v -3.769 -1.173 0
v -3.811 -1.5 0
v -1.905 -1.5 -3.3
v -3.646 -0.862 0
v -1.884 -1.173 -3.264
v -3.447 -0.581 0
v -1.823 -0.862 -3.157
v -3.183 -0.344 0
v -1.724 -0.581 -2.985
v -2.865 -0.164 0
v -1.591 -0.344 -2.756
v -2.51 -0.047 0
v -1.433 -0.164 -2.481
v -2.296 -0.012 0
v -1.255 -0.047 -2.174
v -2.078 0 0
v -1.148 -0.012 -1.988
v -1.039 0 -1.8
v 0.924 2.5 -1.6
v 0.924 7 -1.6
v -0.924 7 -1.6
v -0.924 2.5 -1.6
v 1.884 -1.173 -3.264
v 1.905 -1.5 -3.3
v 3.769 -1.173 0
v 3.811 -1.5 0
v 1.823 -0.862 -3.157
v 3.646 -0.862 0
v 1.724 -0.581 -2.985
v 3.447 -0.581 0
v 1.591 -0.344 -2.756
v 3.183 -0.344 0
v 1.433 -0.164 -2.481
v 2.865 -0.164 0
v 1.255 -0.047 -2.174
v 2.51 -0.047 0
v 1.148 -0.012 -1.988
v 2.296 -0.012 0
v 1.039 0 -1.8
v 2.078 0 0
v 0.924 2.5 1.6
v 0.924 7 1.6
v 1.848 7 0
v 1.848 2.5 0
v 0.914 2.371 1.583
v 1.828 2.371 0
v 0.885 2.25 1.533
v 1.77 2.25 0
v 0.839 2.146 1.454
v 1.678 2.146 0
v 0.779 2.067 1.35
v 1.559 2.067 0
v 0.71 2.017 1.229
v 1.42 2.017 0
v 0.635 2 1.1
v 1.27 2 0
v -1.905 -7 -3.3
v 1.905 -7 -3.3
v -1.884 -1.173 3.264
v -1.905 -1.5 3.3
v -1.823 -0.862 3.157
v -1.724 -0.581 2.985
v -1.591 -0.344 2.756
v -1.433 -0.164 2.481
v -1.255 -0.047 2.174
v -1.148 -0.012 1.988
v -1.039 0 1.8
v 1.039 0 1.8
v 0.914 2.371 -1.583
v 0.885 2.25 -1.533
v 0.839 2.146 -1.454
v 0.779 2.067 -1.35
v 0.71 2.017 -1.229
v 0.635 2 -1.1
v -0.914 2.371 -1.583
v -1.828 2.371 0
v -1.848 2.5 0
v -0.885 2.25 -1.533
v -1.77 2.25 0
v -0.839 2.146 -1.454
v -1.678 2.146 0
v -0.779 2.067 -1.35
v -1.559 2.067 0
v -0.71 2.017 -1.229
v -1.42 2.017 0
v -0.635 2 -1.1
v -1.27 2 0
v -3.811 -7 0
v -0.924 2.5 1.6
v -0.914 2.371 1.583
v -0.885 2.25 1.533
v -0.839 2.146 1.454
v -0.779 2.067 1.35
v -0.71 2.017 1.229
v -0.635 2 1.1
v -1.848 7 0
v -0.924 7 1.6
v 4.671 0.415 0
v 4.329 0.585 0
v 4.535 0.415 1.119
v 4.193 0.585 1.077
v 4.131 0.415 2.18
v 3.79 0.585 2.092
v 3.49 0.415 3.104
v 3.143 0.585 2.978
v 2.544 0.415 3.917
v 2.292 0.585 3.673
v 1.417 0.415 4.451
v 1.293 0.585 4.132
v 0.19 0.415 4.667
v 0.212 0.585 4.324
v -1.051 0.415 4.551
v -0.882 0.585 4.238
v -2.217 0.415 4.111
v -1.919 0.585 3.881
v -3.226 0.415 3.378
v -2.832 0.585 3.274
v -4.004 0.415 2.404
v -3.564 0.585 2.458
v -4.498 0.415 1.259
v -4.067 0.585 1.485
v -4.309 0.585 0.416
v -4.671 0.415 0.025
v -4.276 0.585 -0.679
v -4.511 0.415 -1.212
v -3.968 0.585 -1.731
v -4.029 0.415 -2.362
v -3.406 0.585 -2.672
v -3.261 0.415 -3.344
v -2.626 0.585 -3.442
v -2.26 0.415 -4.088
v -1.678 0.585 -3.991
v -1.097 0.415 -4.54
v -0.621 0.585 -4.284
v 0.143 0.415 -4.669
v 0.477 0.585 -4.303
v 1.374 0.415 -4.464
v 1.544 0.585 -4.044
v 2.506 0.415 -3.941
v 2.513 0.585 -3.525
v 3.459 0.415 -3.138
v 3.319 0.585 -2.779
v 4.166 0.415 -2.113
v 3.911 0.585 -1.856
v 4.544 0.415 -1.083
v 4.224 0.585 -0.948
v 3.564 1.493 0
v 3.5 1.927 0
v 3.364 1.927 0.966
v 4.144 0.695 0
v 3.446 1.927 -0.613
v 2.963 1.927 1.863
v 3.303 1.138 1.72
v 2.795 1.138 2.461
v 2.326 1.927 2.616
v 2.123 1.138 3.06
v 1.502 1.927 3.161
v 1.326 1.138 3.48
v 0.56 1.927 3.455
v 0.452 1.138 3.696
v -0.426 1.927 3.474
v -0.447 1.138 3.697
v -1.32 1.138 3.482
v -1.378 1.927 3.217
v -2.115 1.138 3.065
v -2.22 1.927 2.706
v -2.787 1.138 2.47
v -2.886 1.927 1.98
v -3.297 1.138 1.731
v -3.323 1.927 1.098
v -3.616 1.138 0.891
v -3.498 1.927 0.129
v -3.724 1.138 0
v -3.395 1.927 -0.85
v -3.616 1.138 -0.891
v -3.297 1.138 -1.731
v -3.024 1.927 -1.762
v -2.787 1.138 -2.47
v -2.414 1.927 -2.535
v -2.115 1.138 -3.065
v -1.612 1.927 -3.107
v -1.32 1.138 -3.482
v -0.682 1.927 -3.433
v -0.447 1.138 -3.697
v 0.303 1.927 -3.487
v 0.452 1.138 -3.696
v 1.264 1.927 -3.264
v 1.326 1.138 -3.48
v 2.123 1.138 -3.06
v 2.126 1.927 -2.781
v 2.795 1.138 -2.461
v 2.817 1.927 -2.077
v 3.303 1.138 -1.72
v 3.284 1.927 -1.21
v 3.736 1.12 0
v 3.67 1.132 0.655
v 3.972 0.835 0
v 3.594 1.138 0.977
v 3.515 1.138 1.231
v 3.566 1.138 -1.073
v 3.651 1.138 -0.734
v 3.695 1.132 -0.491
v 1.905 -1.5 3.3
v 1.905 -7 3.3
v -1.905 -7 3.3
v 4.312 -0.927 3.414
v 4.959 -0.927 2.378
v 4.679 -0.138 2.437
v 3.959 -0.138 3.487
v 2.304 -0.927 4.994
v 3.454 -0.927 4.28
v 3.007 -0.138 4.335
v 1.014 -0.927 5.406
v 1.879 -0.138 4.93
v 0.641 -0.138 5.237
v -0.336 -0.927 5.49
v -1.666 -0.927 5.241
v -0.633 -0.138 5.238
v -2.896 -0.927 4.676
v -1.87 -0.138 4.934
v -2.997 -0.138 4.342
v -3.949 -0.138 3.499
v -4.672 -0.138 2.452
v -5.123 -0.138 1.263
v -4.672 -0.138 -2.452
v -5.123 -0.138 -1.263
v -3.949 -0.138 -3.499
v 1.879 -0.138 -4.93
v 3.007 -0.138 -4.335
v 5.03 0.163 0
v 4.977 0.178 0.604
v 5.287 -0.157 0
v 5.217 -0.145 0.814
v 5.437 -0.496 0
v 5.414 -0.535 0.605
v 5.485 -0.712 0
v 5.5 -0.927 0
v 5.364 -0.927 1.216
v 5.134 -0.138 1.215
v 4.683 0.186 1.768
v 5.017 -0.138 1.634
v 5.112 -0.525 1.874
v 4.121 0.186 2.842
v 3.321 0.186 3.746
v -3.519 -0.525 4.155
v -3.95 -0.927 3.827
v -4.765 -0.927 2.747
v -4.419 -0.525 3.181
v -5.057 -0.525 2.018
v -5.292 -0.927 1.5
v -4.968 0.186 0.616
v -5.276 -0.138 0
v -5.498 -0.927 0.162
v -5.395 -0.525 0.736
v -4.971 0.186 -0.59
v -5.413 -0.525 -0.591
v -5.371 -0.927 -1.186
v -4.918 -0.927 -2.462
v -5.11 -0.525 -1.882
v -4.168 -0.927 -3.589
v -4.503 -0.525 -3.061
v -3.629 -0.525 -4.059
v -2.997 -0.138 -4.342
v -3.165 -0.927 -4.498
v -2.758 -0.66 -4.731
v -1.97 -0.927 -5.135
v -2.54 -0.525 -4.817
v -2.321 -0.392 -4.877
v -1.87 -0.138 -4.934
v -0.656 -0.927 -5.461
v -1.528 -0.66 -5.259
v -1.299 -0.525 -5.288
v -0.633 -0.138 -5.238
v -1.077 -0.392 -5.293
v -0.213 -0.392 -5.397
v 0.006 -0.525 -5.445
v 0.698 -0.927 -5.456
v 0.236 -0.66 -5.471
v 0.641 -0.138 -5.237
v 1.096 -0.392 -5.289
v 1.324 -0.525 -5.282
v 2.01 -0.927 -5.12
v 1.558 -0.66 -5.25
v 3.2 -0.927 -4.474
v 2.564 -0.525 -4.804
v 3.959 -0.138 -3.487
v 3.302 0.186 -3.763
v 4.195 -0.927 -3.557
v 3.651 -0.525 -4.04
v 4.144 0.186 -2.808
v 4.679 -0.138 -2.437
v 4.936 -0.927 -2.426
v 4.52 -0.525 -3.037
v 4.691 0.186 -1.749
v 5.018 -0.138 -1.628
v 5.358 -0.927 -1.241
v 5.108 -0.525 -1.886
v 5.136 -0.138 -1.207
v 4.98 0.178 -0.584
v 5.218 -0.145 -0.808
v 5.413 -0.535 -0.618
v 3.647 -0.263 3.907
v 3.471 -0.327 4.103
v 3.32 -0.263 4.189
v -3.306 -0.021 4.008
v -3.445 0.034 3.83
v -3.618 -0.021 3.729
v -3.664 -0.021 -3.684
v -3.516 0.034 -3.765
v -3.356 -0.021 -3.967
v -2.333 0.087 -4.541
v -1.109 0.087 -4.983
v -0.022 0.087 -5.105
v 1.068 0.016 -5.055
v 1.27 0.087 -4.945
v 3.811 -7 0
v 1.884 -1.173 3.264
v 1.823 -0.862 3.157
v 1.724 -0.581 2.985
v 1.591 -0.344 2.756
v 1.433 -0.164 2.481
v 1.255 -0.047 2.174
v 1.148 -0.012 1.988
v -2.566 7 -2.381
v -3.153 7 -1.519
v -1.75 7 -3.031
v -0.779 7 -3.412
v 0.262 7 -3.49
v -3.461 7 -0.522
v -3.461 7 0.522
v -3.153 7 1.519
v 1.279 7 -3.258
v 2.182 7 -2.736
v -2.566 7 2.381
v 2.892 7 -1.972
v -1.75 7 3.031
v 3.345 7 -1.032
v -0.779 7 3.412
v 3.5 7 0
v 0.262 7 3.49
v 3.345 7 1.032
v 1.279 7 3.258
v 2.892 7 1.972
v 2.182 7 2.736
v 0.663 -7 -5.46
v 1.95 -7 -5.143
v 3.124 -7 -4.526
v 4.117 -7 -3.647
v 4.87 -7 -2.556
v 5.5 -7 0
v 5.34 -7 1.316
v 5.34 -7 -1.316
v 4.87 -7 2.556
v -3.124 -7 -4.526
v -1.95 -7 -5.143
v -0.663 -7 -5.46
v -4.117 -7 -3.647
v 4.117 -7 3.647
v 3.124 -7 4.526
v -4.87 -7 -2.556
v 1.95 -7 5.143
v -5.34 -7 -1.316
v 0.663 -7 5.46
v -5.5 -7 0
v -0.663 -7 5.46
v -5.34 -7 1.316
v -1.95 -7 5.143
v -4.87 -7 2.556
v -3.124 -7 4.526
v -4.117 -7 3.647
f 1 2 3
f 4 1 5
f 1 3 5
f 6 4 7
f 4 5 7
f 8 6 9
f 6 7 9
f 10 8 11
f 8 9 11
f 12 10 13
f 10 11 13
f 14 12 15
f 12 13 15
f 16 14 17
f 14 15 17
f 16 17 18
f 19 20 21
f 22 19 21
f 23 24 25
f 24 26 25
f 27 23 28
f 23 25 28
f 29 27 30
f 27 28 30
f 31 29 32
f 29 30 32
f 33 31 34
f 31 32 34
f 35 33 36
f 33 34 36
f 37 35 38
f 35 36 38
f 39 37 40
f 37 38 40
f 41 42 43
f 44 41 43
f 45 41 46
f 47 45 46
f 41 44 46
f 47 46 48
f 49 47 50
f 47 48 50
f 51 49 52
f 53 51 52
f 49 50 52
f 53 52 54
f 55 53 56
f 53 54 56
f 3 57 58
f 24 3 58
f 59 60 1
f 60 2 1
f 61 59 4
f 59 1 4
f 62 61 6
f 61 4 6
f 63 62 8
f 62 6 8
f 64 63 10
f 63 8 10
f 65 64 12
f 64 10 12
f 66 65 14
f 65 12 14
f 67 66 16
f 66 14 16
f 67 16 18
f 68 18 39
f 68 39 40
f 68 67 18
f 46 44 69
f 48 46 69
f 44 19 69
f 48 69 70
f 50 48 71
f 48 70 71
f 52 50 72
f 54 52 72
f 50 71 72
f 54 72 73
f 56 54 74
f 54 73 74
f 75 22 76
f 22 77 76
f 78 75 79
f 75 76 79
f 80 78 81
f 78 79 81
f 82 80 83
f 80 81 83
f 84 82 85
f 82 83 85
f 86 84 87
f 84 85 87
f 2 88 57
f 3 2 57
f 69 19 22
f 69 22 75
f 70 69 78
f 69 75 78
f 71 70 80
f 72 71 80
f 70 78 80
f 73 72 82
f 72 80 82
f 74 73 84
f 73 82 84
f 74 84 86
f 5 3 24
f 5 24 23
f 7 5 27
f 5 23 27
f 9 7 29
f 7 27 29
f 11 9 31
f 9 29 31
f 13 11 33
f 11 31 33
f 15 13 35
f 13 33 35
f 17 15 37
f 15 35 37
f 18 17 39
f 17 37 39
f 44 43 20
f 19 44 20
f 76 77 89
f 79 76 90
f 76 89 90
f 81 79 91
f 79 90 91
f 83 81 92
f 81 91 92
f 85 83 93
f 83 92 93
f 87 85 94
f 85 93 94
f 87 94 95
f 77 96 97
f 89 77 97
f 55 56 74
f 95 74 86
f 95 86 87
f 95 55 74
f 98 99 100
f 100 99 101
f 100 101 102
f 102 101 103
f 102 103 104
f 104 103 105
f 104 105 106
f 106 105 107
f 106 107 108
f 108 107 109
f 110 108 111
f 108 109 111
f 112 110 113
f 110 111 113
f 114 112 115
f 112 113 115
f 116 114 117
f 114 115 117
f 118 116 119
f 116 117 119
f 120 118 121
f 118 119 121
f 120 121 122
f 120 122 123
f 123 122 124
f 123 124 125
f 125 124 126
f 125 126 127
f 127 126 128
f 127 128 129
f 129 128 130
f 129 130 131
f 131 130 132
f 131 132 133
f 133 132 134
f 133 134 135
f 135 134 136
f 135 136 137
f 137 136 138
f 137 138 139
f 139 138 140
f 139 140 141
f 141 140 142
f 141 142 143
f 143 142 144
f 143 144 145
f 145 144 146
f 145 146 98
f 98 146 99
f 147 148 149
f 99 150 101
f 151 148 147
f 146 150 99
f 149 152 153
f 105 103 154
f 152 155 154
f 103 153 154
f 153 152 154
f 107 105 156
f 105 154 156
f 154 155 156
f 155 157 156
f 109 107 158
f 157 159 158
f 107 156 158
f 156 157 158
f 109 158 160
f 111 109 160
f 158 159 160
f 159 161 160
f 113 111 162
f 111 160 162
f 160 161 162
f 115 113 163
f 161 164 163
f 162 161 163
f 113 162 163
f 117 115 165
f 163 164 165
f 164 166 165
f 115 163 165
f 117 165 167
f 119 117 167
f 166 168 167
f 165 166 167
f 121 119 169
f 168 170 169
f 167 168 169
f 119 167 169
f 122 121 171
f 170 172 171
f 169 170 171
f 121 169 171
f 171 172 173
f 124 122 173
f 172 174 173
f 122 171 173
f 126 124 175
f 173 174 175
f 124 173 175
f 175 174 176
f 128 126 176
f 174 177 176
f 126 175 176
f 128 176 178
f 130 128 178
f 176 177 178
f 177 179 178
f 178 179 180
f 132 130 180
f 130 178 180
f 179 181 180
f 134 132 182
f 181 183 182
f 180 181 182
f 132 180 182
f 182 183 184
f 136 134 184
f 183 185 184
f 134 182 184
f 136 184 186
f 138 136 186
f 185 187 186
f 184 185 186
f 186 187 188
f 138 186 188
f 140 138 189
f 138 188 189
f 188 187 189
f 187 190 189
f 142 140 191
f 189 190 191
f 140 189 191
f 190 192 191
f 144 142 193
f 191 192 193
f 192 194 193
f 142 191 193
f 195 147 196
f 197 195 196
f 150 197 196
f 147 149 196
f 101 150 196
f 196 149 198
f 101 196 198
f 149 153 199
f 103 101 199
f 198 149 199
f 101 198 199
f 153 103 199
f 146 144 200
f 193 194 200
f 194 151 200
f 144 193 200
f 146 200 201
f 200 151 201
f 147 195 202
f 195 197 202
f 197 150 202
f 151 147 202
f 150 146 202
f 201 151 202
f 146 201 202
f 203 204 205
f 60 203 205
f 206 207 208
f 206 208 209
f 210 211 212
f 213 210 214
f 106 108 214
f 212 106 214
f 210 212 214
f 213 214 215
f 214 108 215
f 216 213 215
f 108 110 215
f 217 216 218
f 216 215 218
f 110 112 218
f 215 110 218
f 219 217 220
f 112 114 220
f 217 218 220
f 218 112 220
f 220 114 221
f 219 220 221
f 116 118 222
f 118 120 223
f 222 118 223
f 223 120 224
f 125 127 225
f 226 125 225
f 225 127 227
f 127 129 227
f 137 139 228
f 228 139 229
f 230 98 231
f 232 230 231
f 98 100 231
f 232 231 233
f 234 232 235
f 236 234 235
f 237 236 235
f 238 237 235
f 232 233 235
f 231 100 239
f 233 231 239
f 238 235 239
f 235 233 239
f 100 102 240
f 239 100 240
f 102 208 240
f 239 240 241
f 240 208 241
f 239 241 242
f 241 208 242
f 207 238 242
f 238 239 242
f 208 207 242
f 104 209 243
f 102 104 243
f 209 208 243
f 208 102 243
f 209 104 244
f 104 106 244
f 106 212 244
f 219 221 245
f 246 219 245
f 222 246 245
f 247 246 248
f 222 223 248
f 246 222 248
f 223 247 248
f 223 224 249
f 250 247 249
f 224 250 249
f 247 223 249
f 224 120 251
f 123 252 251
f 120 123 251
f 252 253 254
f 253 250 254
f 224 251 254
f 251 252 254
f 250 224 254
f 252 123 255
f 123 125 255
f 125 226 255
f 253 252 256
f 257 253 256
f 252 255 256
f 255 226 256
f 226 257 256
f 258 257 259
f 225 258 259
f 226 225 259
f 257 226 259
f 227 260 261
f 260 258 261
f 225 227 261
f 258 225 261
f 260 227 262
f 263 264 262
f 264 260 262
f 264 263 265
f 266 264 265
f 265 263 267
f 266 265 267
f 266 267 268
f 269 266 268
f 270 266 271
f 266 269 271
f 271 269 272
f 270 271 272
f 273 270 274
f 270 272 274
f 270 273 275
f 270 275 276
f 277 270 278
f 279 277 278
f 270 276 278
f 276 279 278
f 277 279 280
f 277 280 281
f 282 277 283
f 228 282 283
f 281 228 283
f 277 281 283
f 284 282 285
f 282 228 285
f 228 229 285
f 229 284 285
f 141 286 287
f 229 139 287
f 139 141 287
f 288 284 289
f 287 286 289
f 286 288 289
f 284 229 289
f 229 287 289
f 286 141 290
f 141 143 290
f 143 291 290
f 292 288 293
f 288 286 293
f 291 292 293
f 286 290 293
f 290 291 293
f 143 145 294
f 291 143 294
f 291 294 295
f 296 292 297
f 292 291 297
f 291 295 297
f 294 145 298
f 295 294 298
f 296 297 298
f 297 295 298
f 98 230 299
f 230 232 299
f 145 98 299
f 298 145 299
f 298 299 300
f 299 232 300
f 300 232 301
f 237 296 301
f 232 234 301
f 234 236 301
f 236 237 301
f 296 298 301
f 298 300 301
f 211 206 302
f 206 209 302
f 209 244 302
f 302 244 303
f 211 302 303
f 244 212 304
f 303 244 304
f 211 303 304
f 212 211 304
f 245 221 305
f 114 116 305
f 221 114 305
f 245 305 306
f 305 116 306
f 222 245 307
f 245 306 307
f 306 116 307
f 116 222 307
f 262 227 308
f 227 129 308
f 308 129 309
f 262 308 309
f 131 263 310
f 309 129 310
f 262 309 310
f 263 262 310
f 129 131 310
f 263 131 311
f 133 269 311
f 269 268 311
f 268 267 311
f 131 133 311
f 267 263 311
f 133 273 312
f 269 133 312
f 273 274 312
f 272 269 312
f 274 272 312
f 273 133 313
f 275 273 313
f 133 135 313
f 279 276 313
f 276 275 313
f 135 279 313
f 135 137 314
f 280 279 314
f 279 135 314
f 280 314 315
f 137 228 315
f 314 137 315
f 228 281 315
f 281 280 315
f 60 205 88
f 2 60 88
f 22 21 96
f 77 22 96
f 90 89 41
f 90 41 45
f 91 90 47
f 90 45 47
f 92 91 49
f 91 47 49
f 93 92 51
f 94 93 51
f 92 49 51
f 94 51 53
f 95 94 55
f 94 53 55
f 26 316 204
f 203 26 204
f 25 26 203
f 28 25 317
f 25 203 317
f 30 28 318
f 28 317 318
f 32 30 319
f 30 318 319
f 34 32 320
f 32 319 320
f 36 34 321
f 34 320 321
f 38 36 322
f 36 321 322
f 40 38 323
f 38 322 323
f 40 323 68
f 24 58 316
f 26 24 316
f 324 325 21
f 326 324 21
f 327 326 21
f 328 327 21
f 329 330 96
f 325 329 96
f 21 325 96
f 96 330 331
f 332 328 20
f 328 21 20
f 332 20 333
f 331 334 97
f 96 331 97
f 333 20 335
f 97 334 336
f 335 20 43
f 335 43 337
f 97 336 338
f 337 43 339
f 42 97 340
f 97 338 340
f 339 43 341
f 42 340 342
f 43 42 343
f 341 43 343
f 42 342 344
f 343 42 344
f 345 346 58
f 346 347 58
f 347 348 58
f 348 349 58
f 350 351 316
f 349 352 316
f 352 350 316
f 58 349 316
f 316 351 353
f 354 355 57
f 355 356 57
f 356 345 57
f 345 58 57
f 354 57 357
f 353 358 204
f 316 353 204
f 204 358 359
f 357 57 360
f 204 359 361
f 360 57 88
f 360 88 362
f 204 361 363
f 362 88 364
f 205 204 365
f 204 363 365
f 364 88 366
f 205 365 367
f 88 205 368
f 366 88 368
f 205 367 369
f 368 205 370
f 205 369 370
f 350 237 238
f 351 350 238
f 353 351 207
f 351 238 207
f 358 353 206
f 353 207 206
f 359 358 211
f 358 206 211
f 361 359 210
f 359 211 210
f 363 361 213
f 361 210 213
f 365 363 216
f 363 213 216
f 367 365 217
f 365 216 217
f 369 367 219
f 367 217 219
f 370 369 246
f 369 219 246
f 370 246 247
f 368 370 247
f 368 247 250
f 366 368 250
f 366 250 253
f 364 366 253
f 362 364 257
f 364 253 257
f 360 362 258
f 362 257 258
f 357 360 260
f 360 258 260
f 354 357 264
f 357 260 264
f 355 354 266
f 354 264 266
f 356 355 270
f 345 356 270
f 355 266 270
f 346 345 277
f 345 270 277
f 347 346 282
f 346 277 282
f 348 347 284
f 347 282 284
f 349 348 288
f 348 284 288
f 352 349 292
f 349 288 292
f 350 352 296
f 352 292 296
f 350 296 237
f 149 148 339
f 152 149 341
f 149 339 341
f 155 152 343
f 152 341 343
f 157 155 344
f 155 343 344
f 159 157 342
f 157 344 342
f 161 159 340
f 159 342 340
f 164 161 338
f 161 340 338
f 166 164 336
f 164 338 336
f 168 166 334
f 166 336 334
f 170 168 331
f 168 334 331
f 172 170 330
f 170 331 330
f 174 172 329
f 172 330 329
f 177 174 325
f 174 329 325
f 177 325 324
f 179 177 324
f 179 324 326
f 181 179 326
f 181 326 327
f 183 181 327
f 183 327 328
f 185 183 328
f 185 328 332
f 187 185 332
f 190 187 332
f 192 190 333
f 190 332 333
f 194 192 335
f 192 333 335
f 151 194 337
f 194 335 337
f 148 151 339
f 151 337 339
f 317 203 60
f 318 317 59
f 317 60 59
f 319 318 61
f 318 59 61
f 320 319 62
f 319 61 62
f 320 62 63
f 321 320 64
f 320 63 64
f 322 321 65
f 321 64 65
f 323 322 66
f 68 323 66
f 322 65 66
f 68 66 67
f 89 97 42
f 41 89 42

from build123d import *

# Parameters (mm, degrees)
F3_DEPTH = 5
F5_R     = 1.5
F6_DEPTH = 7
F7_R     = 1.5
F8_R     = 0.5


with BuildPart() as f1:
    # F0 (on Top) → F1 (revolve)
    with BuildSketch(Plane.XY):
        Polygon((3.5, 1), (3.5, 7), (0, 7), (0, -7), (5.5, -7), (5.5, 0), align=None)
    revolve(axis=Axis((0, -5.739396, 0), (0, -1, 0)))

    # F2 (on face) → F3 (cut)
    with BuildSketch(Plane(origin=(0, 7, 0), x_dir=(-1, 0, 0), z_dir=(0, 1, 0))):
        Polygon((0.92376, -1.6), (1.847521, 0), (0.92376, 1.6), (-0.92376, 1.6), (-1.847521, 0), (-0.92376, -1.6), align=None)
    extrude(amount=-F3_DEPTH, mode=Mode.SUBTRACT)

    # F5
    f5_edges = [f1.edges().sort_by_distance(p)[0] for p in [
        (-5.5, 0, 0),
        (-3.5, 1, 0),
    ]]
    fillet(f5_edges, radius=F5_R)

    # F4 (on face) → F6 (cut)
    with BuildSketch(Plane.XZ.offset(7)):
        Polygon((1.905256, -3.3), (3.810512, 0), (1.905256, 3.3), (-1.905256, 3.3), (-3.810512, 0), (-1.905256, -3.3), align=None)
    extrude(amount=-F6_DEPTH, mode=Mode.SUBTRACT)

    # F7
    f7_edges = [f1.edges().sort_by_distance(p)[0] for p in [
        (0, 0, -3.3),
        (2.857884, 0, -1.65),
        (2.857884, 0, 1.65),
        (0, 0, 3.3),
        (-2.857884, 0, 1.65),
        (-2.857884, 0, -1.65),
    ]]
    fillet(f7_edges, radius=F7_R)

    # F8
    f8_edges = [f1.edges().sort_by_distance(p)[0] for p in [
        (0, 2, -1.6),
        (-1.385641, 2, -0.8),
        (1.385641, 2, -0.8),
        (-1.385641, 2, 0.8),
        (0, 2, 1.6),
        (1.385641, 2, 0.8),
    ]]
    fillet(f8_edges, radius=F8_R)


solid = f1.part
